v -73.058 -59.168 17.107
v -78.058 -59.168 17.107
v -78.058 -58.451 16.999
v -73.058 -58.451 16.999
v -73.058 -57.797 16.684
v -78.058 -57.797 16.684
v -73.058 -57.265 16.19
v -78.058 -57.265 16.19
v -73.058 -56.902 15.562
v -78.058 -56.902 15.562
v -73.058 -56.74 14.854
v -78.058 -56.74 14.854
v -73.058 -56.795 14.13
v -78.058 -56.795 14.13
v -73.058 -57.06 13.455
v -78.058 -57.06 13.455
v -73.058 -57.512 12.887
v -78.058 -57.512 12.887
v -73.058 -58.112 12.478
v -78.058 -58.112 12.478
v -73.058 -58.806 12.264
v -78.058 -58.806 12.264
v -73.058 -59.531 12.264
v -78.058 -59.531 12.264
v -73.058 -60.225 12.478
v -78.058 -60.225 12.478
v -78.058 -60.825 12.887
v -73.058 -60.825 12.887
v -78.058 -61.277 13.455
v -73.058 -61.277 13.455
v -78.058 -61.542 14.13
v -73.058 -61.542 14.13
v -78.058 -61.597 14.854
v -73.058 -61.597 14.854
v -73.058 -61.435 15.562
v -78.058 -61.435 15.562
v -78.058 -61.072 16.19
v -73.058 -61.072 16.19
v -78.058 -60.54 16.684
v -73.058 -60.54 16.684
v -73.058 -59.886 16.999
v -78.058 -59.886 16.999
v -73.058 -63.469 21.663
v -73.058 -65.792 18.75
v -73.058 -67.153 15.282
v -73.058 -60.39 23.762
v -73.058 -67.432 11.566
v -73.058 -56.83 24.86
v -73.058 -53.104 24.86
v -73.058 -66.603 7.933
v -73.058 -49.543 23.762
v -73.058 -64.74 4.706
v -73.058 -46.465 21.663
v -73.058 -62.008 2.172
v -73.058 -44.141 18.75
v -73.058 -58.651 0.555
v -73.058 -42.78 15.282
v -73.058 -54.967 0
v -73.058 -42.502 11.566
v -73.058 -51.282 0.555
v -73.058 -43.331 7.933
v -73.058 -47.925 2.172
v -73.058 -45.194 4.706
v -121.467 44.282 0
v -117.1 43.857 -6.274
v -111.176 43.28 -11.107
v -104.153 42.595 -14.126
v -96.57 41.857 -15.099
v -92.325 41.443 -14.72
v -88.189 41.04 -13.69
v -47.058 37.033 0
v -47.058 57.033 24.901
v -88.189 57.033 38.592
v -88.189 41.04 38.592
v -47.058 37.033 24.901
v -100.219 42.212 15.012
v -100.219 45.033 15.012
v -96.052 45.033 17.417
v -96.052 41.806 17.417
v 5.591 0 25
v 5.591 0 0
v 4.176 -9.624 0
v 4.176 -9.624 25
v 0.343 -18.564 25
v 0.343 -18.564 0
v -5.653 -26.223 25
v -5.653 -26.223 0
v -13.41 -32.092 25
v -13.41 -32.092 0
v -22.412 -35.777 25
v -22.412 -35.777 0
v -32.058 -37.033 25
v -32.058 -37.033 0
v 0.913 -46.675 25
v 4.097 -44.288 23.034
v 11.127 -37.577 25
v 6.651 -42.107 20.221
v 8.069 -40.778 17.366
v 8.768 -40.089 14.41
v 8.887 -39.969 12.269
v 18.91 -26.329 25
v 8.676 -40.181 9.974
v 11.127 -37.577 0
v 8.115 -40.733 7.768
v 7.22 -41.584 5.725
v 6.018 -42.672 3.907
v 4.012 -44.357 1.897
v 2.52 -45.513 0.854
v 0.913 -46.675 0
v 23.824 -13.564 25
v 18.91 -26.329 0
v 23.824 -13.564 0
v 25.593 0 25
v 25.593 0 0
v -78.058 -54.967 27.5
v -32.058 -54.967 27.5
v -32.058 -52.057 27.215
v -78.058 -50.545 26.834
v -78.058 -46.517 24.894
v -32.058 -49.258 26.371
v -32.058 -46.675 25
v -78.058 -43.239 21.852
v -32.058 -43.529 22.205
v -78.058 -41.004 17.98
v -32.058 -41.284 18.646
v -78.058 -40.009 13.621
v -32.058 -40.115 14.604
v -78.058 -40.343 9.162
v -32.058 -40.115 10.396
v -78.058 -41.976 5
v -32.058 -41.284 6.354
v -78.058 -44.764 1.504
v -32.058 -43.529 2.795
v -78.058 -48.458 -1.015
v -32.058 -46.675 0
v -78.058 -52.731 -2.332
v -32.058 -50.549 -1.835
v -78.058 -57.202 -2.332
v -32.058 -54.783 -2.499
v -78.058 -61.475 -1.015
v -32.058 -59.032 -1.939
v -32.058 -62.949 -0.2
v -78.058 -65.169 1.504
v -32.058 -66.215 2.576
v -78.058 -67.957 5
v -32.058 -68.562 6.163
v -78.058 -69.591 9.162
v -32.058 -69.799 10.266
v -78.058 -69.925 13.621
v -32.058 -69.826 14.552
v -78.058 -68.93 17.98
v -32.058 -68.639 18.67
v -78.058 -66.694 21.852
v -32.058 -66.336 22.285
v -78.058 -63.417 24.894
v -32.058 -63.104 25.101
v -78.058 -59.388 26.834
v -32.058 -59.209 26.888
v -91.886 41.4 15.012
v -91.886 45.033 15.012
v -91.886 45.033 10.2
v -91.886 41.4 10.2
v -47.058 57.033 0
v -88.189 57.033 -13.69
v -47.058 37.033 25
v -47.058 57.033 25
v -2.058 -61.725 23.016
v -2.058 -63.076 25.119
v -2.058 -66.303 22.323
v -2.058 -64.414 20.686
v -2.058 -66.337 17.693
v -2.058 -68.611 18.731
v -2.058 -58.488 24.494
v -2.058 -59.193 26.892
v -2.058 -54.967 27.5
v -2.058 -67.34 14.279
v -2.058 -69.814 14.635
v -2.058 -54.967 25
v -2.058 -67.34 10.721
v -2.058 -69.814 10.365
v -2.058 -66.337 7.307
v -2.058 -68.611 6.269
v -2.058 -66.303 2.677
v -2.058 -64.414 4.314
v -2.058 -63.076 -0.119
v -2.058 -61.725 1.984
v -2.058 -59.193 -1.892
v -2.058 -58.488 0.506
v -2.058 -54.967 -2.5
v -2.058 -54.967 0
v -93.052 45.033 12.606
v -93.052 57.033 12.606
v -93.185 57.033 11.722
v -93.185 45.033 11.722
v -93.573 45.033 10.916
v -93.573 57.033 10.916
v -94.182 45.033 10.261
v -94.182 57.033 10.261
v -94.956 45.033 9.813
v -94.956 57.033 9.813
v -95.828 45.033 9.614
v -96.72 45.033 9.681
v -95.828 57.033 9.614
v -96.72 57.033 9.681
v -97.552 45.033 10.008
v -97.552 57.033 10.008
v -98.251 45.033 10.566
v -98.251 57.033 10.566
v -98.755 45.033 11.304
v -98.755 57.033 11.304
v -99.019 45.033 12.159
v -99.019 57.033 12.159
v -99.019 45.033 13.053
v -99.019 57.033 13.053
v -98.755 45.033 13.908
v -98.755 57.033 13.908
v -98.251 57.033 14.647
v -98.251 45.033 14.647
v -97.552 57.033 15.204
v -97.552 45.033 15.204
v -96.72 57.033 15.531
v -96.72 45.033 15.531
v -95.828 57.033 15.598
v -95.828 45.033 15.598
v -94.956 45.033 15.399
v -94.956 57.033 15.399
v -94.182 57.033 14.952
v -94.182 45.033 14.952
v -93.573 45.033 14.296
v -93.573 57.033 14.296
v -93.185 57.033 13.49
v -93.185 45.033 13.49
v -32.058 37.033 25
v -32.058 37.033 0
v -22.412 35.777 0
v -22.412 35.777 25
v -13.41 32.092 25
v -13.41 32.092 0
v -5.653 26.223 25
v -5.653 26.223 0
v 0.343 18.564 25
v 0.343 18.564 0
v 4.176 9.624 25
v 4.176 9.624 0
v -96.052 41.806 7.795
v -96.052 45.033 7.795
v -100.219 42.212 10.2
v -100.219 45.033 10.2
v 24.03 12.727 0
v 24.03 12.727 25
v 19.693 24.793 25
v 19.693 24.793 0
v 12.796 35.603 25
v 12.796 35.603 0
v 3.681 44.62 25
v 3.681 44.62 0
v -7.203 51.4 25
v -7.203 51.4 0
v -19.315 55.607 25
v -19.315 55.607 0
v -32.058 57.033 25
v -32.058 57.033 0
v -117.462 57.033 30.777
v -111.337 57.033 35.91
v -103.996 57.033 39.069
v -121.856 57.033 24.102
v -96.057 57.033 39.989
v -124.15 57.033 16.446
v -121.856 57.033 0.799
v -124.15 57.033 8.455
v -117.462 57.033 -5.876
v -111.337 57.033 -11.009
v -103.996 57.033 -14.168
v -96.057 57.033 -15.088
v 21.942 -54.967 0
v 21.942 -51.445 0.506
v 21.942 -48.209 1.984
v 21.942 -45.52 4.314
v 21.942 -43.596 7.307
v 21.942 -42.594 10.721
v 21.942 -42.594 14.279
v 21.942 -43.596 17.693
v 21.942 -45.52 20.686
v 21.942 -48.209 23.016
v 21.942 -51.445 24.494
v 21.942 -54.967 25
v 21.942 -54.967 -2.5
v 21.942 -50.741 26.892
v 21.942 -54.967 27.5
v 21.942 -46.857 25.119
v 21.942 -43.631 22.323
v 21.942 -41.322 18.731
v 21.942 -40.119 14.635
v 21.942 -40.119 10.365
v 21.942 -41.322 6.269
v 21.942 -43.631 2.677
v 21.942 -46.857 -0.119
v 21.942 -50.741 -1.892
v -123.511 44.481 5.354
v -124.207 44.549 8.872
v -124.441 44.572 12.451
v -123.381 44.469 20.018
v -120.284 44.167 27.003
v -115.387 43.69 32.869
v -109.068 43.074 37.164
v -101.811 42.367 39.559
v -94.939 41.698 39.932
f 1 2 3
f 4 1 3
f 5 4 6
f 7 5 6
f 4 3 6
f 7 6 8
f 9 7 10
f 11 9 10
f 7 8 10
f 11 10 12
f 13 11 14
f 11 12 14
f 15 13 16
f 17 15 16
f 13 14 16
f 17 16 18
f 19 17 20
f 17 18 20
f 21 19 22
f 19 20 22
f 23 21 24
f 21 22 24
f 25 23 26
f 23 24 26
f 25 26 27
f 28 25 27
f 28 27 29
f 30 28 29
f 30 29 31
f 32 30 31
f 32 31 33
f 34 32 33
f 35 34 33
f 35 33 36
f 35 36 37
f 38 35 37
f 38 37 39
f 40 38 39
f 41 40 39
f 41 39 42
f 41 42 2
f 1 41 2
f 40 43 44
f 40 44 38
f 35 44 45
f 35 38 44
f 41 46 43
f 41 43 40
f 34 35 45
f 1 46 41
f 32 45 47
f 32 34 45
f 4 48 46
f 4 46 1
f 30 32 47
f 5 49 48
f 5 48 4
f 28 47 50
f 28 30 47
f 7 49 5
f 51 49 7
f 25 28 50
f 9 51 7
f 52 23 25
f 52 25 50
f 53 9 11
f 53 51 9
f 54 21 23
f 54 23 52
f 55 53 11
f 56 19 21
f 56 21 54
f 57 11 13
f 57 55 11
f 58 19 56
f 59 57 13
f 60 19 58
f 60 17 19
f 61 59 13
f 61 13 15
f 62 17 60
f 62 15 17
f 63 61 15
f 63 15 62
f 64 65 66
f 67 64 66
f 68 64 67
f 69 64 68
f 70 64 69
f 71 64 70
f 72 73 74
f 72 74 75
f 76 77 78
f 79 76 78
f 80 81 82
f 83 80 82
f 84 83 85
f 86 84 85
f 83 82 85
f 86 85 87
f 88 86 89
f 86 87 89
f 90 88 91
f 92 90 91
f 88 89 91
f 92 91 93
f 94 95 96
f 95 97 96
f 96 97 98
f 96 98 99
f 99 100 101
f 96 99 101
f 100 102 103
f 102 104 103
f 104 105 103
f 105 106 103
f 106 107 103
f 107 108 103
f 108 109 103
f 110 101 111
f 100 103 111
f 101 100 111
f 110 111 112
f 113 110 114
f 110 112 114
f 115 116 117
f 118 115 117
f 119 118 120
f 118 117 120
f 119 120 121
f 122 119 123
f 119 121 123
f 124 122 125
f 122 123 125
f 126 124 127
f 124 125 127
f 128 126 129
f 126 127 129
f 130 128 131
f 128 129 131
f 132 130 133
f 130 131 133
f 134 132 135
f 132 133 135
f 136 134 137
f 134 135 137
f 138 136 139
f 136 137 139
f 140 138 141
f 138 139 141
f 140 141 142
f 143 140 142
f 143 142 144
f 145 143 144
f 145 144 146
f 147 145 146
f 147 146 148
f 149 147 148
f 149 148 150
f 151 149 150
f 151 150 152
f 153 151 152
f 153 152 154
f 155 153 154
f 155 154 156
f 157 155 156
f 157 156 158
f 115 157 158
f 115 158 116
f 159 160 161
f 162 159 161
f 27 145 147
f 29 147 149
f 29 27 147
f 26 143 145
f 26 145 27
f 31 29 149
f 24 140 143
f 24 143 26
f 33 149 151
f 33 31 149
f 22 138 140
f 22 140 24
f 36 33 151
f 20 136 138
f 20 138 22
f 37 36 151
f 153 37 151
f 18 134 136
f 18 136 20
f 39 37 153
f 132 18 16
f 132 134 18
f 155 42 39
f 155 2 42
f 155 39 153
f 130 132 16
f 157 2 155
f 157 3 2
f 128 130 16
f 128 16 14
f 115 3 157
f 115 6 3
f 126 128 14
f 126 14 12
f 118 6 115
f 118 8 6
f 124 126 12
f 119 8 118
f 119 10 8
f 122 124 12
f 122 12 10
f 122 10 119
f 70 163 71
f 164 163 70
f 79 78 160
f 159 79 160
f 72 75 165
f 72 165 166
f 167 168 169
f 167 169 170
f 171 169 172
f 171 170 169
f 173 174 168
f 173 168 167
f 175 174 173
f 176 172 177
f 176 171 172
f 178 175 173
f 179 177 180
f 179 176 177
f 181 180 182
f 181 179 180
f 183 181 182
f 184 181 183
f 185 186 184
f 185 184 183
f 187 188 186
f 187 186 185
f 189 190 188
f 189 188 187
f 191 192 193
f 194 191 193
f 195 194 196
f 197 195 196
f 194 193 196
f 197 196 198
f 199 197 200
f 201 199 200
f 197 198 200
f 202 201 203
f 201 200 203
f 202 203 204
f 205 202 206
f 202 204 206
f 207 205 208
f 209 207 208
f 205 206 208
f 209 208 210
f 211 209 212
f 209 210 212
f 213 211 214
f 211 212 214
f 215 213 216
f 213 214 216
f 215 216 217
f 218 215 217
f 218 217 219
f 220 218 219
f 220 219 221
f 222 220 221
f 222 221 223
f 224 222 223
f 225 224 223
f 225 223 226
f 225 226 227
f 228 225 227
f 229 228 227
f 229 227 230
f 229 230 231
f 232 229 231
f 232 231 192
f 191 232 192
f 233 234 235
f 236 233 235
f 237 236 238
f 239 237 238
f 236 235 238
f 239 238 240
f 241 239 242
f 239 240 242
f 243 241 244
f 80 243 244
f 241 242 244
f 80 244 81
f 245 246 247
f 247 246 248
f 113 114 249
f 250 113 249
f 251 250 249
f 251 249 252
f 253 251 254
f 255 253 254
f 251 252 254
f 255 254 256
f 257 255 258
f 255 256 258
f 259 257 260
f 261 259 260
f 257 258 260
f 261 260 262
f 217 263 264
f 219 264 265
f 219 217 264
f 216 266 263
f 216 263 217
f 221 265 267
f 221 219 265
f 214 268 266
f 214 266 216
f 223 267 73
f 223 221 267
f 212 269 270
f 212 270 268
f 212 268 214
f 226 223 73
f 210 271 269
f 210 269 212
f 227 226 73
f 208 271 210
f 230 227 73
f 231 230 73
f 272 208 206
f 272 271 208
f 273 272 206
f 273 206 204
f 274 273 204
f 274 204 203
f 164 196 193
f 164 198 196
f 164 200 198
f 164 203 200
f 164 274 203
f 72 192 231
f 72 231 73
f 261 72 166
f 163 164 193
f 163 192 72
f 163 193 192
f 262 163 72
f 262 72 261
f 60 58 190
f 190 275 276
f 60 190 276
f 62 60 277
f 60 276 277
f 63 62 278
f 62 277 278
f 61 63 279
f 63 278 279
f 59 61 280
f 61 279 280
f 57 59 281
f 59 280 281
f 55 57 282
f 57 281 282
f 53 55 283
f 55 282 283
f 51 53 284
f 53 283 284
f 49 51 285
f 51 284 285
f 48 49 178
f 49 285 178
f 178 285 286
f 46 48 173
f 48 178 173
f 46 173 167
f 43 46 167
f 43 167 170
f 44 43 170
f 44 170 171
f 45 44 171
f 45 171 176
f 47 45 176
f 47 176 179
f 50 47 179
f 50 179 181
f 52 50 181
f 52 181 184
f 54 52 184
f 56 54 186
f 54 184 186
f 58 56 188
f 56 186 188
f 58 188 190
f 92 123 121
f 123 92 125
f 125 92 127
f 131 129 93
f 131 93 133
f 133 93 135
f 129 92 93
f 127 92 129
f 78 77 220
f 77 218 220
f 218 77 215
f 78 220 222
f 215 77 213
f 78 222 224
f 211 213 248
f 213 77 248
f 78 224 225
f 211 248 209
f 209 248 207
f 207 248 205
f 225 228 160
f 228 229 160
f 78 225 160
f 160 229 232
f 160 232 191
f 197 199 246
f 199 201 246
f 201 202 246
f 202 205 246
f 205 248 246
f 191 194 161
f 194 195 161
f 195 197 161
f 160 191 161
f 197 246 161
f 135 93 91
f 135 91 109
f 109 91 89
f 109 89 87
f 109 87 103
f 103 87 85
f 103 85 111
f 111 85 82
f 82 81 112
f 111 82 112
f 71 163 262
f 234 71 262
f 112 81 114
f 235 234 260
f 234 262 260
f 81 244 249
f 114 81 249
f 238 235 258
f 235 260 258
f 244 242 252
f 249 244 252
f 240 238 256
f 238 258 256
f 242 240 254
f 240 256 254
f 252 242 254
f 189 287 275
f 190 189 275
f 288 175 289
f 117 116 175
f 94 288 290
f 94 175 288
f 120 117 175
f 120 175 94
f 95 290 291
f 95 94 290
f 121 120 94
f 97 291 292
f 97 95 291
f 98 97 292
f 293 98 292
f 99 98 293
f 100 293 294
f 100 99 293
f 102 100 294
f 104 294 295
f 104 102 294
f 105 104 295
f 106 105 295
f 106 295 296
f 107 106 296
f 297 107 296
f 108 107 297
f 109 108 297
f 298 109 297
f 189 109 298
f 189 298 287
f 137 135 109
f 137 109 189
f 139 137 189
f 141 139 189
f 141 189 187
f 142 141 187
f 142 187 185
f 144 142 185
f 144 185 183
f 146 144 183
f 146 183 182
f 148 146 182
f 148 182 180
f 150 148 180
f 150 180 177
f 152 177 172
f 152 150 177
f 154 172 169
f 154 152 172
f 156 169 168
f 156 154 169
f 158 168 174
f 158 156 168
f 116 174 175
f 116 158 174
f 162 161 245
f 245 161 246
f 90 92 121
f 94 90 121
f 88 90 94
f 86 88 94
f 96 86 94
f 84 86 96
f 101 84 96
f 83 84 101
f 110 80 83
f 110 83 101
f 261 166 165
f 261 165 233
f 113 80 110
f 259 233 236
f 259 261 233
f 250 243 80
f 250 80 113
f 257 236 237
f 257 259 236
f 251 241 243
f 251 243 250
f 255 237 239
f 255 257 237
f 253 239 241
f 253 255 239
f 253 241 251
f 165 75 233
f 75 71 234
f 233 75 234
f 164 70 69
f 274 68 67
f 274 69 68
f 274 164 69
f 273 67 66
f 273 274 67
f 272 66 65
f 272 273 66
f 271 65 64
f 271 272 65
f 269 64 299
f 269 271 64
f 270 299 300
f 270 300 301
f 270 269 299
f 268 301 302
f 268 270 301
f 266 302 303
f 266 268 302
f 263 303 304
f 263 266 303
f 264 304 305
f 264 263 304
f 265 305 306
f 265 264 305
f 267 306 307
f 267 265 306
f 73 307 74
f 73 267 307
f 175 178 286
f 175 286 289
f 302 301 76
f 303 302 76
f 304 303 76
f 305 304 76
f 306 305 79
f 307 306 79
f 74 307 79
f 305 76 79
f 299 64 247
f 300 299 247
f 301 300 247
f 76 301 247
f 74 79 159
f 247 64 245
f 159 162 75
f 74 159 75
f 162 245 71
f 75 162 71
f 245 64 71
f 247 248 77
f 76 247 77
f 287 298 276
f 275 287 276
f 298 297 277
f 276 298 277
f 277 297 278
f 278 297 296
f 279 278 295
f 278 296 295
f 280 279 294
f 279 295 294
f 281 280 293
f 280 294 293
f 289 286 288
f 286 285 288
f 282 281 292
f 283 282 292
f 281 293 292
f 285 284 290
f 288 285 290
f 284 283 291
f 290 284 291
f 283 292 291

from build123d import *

# Parameters (mm, degrees)
BOSS_EXTRUDE2_DEPTH      = 25
BOSS_EXTRUDE4_DEPTH      = 20
BOSS_EXTRUDE5_DEPTH      = 46
BOSS_EXTRUDE5_DEPTH_BACK = 54
SKETCH2_R                = 15
CUT_EXTRUDE1_DEPTH       = 95
SKETCH6_R                = 3
CUT_EXTRUDE2_DEPTH       = 24
CUT_EXTRUDE3_DEPTH       = 149.259919116
CUT_EXTRUDE3_DEPTH_BACK  = 149.259919116
CUT_EXTRUDE5_DEPTH       = 24
SKETCH11_R               = 2.435
CUT_EXTRUDE6_DEPTH       = 132.297538714
CUT_EXTRUDE7_START       = -12
CUT_EXTRUDE7_DEPTH       = 10


with BuildPart() as part:
    # Sketch1 → Boss-Extrude2 (new body)
    with BuildSketch(Plane.XY):
        with BuildLine():
            ThreePointArc((-32.057903297, 37.033246562), (-5.652702459, 26.223247911), (5.591494761, 0))
            ThreePointArc((5.591494761, 0), (-5.652702459, -26.223247911), (-32.057903297, -37.033246562))
            Line((-32.057903297, -37.033246562), (-32.057903297, -57.033246562))
            ThreePointArc((-32.057903297, -57.033246562), (8.489751808, -40.365693604), (25.593272966, 0))
            ThreePointArc((25.593272966, 0), (8.489751808, 40.365693604), (-32.057903297, 57.033246562))
            Line((-32.057903297, 57.033246562), (-47.057903297, 57.033246562))
            Line((-47.057903297, 57.033246562), (-47.057903297, 37.033246562))
            Line((-47.057903297, 37.033246562), (-32.057903297, 37.033246562))
        make_face()
    extrude(amount=BOSS_EXTRUDE2_DEPTH)

    # Sketch3 → Boss-Extrude4 (add)
    with BuildSketch(Plane(origin=(0, 57.033246562, 0), x_dir=(1, 0, 0), z_dir=(0, 1, 0))):
        with BuildLine():
            Line((-47.057903297, -24.901242643), (-47.057903297, 0))
            Line((-47.057903297, 0), (-88.188861039, 13.690366027))
            ThreePointArc((-88.188861039, 13.690366027), (-124.440854646, -12.450621321), (-88.188861039, -38.591608669))
            Line((-88.188861039, -38.591608669), (-47.057903297, -24.901242643))
        make_face()
    extrude(amount=-BOSS_EXTRUDE4_DEPTH)

    # Sketch2 → Boss-Extrude5 (add, two sides: drawn at the far end of the back side and taken through both)
    with BuildSketch(Plane.ZY.offset(32.057903297).offset(-BOSS_EXTRUDE5_DEPTH_BACK)):
        with Locations((12.5, -54.966753438)):
            Circle(SKETCH2_R)
    extrude(amount=BOSS_EXTRUDE5_DEPTH + BOSS_EXTRUDE5_DEPTH_BACK)

    # Sketch5 → Cut-Extrude1 (cut)
    with BuildSketch(Plane(origin=(21.942096703, 0, 0), x_dir=(0, 0, -1), z_dir=(1, 0, 0))):
        with BuildLine():
            ThreePointArc((-25, -54.966753438), (-12.5, -67.466753438), (0, -54.966753438))
            ThreePointArc((0, -54.966753438), (-12.5, -42.466753438), (-25, -54.966753438))
        make_face()
    extrude(amount=-CUT_EXTRUDE1_DEPTH, mode=Mode.SUBTRACT)

    # Sketch6 → Cut-Extrude2 (cut)
    with BuildSketch(Plane(origin=(0, 57.033246562, 0), x_dir=(1, 0, 0), z_dir=(0, 1, 0))):
        with Locations((-96.052193002, -12.606102104)):
            Circle(SKETCH6_R)
    extrude(amount=-CUT_EXTRUDE2_DEPTH, mode=Mode.SUBTRACT)

    # Sketch7 → Cut-Extrude3 (cut, two sides: drawn at the far end of the back side and taken through both)
    with BuildSketch(Plane.XY.offset(-CUT_EXTRUDE3_DEPTH_BACK)):
        Polygon((-124.440854646, 44.571784262), (-47.057903297, 37.033246562), (-124.440854646, 37.033246562), align=None)
    extrude(amount=CUT_EXTRUDE3_DEPTH + CUT_EXTRUDE3_DEPTH_BACK, mode=Mode.SUBTRACT)

    # Sketch5<3> → Cut-Extrude5 (cut)
    with BuildSketch(Plane(origin=(21.942096703, 0, 0), x_dir=(0, 0, -1), z_dir=(1, 0, 0))):
        with BuildLine():
            Line((2.5, -54.966753438), (0, -54.966753438))
            ThreePointArc((0, -54.966753438), (-12.5, -67.466753438), (-25, -54.966753438))
            Line((-25, -54.966753438), (-27.5, -54.966753438))
            ThreePointArc((-27.5, -54.966753438), (-12.5, -69.966753438), (2.5, -54.966753438))
        make_face()
    extrude(amount=-CUT_EXTRUDE5_DEPTH, mode=Mode.SUBTRACT)

    # Sketch11 → Cut-Extrude6 (cut, through all)
    with BuildSketch(Plane.ZY.offset(78.057903297)):
        with Locations((14.672182151, -59.168482213)):
            Circle(SKETCH11_R)
    extrude(amount=-CUT_EXTRUDE6_DEPTH, mode=Mode.SUBTRACT)

    # Sketch13 → Cut-Extrude7 (cut)
    with BuildSketch(Plane(origin=(0, 57.033246562, 0), x_dir=(1, 0, 0), z_dir=(0, 1, 0)).offset(CUT_EXTRUDE7_START)):
        Polygon((-96.052193002, -7.794849861), (-100.218859669, -10.200475983), (-100.218859669, -15.011728226), (-96.052193002, -17.417354348), (-91.885526335, -15.011728226), (-91.885526335, -10.200475983), align=None)
    extrude(amount=-CUT_EXTRUDE7_DEPTH, mode=Mode.SUBTRACT)


solid = part.part
